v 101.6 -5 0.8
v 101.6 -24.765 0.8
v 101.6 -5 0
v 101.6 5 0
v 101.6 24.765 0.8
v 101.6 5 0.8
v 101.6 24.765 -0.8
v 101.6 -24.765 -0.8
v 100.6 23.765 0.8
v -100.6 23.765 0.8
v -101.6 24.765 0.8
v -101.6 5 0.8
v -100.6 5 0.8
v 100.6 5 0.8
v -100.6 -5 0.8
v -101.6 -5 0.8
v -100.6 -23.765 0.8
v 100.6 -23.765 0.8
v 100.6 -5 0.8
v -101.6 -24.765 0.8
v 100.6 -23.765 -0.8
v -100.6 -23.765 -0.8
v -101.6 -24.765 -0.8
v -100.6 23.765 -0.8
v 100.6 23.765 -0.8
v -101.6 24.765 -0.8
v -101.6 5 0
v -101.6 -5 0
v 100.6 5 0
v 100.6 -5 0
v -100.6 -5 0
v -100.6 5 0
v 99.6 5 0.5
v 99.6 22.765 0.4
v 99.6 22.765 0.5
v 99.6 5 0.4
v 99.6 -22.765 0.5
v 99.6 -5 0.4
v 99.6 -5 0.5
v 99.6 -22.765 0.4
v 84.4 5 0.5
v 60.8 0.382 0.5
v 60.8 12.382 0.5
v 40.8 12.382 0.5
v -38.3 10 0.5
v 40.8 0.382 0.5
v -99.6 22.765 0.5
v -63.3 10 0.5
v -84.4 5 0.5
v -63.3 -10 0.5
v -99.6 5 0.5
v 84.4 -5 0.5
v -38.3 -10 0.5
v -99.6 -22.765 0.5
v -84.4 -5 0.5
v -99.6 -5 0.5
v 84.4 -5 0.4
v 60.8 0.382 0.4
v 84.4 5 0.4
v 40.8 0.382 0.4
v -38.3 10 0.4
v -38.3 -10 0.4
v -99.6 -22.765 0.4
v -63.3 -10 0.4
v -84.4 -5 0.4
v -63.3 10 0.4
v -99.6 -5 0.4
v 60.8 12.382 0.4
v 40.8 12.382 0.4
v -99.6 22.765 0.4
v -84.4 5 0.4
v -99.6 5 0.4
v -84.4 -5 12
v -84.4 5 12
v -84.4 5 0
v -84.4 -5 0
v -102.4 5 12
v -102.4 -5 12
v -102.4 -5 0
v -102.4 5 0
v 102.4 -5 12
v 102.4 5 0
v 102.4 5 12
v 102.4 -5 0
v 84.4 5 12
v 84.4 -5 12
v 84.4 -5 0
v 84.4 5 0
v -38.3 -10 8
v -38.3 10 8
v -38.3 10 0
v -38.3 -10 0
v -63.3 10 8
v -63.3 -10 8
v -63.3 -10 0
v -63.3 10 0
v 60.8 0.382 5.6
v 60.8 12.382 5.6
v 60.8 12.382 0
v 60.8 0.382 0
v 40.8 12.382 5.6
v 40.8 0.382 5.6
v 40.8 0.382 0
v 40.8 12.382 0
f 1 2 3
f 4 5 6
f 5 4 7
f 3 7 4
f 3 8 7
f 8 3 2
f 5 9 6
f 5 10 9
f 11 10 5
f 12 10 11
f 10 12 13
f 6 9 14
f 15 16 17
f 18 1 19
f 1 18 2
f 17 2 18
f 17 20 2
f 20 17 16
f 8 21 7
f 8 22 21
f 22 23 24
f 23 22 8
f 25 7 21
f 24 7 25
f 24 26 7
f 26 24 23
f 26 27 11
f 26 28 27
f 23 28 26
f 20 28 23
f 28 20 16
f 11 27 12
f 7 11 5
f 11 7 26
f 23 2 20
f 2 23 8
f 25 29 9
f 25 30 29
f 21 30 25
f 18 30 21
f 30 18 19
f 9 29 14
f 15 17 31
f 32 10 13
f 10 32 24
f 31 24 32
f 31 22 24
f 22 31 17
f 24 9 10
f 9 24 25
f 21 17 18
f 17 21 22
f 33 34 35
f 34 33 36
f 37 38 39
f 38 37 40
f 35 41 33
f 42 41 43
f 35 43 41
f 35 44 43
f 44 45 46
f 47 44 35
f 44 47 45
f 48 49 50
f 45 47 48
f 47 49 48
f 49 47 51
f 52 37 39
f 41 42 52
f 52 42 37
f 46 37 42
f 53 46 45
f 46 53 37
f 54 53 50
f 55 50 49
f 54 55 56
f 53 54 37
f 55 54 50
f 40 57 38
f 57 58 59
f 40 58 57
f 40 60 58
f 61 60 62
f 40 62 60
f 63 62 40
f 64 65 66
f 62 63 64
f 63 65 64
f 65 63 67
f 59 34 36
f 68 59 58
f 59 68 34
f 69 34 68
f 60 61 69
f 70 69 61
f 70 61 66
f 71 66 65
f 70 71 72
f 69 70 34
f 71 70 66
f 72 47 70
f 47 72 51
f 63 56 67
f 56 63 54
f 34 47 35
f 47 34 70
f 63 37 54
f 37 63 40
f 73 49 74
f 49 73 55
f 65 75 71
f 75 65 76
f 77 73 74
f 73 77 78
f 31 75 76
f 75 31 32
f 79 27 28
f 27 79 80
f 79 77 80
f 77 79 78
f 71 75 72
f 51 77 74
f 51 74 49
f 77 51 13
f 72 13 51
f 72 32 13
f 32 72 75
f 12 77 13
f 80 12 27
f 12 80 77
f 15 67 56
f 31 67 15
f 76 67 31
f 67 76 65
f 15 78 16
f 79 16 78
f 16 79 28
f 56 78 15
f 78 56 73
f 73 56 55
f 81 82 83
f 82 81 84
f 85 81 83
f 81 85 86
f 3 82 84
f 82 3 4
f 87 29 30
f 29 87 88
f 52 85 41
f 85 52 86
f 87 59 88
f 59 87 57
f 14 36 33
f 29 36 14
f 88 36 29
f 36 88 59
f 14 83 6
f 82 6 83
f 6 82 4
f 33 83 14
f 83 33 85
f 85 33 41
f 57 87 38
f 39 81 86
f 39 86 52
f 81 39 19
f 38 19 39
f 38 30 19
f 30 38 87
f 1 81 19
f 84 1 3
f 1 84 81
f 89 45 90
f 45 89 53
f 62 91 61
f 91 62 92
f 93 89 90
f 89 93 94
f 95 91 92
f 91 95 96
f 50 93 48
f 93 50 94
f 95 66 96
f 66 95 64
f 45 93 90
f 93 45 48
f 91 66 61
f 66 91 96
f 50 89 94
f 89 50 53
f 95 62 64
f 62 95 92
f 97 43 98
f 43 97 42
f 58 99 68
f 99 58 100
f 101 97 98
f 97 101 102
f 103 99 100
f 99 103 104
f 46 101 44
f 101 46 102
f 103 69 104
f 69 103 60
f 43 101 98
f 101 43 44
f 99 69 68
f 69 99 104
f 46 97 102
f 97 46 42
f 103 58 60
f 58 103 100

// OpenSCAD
// Parameters
pcb_length = 203.2; //[101.6:406.4:0.1]
pcb_width = 49.53; //[24.765:99.06:0.01]
pcb_thickness = 1.6; //[0.8:3.2:0.1]
hole_diameter = 3.2; //[2.0:6.0:0.1]
hole_edge_offset_x = 6.0; //[3.0:15.0:0.5]
hole_edge_offset_y = 6.0; //[3.0:15.0:0.5]
chamfer_size = 1.0; //[0.5:3.0:0.1]
silkscreen_thickness = 0.1; //[0.05:0.3:0.01]
silkscreen_margin = 2.0; //[0.5:6.0:0.5]
component_height = 8.0; //[3.0:20.0:0.5]
connector_height = 12.0; //[5.0:30.0:0.5]
connector_depth_y = 10.0; //[5.0:25.0:0.5]
connector_length_x = 18.0; //[8.0:40.0:0.5]
component_block_x = 25.0; //[10.0:60.0:0.5]
component_block_y = 20.0; //[8.0:40.0:0.5]
overlap = 0.8; //[0.2:2.0:0.1]

// Main PCB Body
module pcb_main_body() {
  color([0.0, 0.4, 0.2]) // Green PCB
  cube([pcb_length, pcb_width, pcb_thickness], center=true);
}

// Mounting Holes
module mounting_hole(x, y) {
  translate([x, y, 0])
    cylinder(h=pcb_thickness + 2*overlap, r=hole_diameter/2, center=true);
}

module mounting_holes() {
  union() {
    mounting_hole(-pcb_length/2 + hole_edge_offset_x, -pcb_width/2 + hole_edge_offset_y);
    mounting_hole(pcb_length/2 - hole_edge_offset_x, -pcb_width/2 + hole_edge_offset_y);
    mounting_hole(-pcb_length/2 + hole_edge_offset_x, pcb_width/2 - hole_edge_offset_y);
    mounting_hole(pcb_length/2 - hole_edge_offset_x, pcb_width/2 - hole_edge_offset_y);
  }
}

// Edge Chamfer
module board_edge_chamfer_cut() {
  translate([0, 0, pcb_thickness/2 - (chamfer_size + overlap)/2])
    cube([pcb_length - 2*chamfer_size, pcb_width - 2*chamfer_size, chamfer_size + overlap], center=true);
}

// Silkscreen Markings
module silkscreen_markings() {
  translate([0, 0, pcb_thickness/2 + silkscreen_thickness/2 - overlap/2])
    color("White")
    cube([pcb_length - 2*silkscreen_margin, pcb_width - 2*silkscreen_margin, silkscreen_thickness], center=true);
}

// Connectors
module connector(x) {
  translate([x, 0, pcb_thickness/2 + connector_height/2 - overlap])
    color("DimGray")
    cube([connector_length_x, connector_depth_y, connector_height], center=true);
}

// Components
module component_block(x, y, z) {
  translate([x, y, z])
    color("Black")
    cube([component_block_x, component_block_y, component_height], center=true);
}

module component_block_2() {
  translate([pcb_length/4, pcb_width/4 - component_block_y*0.3, pcb_thickness/2 + (component_height*0.7)/2 - overlap])
    color("Black")
    cube([component_block_x*0.8, component_block_y*0.6, component_height*0.7], center=true);
}

// Complete Board Model
module complete_board_model() {
  difference() {
    pcb_main_body();
    mounting_holes();
    board_edge_chamfer_cut();
  }
  union() {
    silkscreen_markings();
    connector(-pcb_length/2 + connector_length_x/2 - overlap);
    connector(pcb_length/2 - connector_length_x/2 + overlap);
    component_block(-pcb_length/4, 0, pcb_thickness/2 + component_height/2 - overlap);
    component_block_2();
  }
}

// Render the complete board model
complete_board_model();
